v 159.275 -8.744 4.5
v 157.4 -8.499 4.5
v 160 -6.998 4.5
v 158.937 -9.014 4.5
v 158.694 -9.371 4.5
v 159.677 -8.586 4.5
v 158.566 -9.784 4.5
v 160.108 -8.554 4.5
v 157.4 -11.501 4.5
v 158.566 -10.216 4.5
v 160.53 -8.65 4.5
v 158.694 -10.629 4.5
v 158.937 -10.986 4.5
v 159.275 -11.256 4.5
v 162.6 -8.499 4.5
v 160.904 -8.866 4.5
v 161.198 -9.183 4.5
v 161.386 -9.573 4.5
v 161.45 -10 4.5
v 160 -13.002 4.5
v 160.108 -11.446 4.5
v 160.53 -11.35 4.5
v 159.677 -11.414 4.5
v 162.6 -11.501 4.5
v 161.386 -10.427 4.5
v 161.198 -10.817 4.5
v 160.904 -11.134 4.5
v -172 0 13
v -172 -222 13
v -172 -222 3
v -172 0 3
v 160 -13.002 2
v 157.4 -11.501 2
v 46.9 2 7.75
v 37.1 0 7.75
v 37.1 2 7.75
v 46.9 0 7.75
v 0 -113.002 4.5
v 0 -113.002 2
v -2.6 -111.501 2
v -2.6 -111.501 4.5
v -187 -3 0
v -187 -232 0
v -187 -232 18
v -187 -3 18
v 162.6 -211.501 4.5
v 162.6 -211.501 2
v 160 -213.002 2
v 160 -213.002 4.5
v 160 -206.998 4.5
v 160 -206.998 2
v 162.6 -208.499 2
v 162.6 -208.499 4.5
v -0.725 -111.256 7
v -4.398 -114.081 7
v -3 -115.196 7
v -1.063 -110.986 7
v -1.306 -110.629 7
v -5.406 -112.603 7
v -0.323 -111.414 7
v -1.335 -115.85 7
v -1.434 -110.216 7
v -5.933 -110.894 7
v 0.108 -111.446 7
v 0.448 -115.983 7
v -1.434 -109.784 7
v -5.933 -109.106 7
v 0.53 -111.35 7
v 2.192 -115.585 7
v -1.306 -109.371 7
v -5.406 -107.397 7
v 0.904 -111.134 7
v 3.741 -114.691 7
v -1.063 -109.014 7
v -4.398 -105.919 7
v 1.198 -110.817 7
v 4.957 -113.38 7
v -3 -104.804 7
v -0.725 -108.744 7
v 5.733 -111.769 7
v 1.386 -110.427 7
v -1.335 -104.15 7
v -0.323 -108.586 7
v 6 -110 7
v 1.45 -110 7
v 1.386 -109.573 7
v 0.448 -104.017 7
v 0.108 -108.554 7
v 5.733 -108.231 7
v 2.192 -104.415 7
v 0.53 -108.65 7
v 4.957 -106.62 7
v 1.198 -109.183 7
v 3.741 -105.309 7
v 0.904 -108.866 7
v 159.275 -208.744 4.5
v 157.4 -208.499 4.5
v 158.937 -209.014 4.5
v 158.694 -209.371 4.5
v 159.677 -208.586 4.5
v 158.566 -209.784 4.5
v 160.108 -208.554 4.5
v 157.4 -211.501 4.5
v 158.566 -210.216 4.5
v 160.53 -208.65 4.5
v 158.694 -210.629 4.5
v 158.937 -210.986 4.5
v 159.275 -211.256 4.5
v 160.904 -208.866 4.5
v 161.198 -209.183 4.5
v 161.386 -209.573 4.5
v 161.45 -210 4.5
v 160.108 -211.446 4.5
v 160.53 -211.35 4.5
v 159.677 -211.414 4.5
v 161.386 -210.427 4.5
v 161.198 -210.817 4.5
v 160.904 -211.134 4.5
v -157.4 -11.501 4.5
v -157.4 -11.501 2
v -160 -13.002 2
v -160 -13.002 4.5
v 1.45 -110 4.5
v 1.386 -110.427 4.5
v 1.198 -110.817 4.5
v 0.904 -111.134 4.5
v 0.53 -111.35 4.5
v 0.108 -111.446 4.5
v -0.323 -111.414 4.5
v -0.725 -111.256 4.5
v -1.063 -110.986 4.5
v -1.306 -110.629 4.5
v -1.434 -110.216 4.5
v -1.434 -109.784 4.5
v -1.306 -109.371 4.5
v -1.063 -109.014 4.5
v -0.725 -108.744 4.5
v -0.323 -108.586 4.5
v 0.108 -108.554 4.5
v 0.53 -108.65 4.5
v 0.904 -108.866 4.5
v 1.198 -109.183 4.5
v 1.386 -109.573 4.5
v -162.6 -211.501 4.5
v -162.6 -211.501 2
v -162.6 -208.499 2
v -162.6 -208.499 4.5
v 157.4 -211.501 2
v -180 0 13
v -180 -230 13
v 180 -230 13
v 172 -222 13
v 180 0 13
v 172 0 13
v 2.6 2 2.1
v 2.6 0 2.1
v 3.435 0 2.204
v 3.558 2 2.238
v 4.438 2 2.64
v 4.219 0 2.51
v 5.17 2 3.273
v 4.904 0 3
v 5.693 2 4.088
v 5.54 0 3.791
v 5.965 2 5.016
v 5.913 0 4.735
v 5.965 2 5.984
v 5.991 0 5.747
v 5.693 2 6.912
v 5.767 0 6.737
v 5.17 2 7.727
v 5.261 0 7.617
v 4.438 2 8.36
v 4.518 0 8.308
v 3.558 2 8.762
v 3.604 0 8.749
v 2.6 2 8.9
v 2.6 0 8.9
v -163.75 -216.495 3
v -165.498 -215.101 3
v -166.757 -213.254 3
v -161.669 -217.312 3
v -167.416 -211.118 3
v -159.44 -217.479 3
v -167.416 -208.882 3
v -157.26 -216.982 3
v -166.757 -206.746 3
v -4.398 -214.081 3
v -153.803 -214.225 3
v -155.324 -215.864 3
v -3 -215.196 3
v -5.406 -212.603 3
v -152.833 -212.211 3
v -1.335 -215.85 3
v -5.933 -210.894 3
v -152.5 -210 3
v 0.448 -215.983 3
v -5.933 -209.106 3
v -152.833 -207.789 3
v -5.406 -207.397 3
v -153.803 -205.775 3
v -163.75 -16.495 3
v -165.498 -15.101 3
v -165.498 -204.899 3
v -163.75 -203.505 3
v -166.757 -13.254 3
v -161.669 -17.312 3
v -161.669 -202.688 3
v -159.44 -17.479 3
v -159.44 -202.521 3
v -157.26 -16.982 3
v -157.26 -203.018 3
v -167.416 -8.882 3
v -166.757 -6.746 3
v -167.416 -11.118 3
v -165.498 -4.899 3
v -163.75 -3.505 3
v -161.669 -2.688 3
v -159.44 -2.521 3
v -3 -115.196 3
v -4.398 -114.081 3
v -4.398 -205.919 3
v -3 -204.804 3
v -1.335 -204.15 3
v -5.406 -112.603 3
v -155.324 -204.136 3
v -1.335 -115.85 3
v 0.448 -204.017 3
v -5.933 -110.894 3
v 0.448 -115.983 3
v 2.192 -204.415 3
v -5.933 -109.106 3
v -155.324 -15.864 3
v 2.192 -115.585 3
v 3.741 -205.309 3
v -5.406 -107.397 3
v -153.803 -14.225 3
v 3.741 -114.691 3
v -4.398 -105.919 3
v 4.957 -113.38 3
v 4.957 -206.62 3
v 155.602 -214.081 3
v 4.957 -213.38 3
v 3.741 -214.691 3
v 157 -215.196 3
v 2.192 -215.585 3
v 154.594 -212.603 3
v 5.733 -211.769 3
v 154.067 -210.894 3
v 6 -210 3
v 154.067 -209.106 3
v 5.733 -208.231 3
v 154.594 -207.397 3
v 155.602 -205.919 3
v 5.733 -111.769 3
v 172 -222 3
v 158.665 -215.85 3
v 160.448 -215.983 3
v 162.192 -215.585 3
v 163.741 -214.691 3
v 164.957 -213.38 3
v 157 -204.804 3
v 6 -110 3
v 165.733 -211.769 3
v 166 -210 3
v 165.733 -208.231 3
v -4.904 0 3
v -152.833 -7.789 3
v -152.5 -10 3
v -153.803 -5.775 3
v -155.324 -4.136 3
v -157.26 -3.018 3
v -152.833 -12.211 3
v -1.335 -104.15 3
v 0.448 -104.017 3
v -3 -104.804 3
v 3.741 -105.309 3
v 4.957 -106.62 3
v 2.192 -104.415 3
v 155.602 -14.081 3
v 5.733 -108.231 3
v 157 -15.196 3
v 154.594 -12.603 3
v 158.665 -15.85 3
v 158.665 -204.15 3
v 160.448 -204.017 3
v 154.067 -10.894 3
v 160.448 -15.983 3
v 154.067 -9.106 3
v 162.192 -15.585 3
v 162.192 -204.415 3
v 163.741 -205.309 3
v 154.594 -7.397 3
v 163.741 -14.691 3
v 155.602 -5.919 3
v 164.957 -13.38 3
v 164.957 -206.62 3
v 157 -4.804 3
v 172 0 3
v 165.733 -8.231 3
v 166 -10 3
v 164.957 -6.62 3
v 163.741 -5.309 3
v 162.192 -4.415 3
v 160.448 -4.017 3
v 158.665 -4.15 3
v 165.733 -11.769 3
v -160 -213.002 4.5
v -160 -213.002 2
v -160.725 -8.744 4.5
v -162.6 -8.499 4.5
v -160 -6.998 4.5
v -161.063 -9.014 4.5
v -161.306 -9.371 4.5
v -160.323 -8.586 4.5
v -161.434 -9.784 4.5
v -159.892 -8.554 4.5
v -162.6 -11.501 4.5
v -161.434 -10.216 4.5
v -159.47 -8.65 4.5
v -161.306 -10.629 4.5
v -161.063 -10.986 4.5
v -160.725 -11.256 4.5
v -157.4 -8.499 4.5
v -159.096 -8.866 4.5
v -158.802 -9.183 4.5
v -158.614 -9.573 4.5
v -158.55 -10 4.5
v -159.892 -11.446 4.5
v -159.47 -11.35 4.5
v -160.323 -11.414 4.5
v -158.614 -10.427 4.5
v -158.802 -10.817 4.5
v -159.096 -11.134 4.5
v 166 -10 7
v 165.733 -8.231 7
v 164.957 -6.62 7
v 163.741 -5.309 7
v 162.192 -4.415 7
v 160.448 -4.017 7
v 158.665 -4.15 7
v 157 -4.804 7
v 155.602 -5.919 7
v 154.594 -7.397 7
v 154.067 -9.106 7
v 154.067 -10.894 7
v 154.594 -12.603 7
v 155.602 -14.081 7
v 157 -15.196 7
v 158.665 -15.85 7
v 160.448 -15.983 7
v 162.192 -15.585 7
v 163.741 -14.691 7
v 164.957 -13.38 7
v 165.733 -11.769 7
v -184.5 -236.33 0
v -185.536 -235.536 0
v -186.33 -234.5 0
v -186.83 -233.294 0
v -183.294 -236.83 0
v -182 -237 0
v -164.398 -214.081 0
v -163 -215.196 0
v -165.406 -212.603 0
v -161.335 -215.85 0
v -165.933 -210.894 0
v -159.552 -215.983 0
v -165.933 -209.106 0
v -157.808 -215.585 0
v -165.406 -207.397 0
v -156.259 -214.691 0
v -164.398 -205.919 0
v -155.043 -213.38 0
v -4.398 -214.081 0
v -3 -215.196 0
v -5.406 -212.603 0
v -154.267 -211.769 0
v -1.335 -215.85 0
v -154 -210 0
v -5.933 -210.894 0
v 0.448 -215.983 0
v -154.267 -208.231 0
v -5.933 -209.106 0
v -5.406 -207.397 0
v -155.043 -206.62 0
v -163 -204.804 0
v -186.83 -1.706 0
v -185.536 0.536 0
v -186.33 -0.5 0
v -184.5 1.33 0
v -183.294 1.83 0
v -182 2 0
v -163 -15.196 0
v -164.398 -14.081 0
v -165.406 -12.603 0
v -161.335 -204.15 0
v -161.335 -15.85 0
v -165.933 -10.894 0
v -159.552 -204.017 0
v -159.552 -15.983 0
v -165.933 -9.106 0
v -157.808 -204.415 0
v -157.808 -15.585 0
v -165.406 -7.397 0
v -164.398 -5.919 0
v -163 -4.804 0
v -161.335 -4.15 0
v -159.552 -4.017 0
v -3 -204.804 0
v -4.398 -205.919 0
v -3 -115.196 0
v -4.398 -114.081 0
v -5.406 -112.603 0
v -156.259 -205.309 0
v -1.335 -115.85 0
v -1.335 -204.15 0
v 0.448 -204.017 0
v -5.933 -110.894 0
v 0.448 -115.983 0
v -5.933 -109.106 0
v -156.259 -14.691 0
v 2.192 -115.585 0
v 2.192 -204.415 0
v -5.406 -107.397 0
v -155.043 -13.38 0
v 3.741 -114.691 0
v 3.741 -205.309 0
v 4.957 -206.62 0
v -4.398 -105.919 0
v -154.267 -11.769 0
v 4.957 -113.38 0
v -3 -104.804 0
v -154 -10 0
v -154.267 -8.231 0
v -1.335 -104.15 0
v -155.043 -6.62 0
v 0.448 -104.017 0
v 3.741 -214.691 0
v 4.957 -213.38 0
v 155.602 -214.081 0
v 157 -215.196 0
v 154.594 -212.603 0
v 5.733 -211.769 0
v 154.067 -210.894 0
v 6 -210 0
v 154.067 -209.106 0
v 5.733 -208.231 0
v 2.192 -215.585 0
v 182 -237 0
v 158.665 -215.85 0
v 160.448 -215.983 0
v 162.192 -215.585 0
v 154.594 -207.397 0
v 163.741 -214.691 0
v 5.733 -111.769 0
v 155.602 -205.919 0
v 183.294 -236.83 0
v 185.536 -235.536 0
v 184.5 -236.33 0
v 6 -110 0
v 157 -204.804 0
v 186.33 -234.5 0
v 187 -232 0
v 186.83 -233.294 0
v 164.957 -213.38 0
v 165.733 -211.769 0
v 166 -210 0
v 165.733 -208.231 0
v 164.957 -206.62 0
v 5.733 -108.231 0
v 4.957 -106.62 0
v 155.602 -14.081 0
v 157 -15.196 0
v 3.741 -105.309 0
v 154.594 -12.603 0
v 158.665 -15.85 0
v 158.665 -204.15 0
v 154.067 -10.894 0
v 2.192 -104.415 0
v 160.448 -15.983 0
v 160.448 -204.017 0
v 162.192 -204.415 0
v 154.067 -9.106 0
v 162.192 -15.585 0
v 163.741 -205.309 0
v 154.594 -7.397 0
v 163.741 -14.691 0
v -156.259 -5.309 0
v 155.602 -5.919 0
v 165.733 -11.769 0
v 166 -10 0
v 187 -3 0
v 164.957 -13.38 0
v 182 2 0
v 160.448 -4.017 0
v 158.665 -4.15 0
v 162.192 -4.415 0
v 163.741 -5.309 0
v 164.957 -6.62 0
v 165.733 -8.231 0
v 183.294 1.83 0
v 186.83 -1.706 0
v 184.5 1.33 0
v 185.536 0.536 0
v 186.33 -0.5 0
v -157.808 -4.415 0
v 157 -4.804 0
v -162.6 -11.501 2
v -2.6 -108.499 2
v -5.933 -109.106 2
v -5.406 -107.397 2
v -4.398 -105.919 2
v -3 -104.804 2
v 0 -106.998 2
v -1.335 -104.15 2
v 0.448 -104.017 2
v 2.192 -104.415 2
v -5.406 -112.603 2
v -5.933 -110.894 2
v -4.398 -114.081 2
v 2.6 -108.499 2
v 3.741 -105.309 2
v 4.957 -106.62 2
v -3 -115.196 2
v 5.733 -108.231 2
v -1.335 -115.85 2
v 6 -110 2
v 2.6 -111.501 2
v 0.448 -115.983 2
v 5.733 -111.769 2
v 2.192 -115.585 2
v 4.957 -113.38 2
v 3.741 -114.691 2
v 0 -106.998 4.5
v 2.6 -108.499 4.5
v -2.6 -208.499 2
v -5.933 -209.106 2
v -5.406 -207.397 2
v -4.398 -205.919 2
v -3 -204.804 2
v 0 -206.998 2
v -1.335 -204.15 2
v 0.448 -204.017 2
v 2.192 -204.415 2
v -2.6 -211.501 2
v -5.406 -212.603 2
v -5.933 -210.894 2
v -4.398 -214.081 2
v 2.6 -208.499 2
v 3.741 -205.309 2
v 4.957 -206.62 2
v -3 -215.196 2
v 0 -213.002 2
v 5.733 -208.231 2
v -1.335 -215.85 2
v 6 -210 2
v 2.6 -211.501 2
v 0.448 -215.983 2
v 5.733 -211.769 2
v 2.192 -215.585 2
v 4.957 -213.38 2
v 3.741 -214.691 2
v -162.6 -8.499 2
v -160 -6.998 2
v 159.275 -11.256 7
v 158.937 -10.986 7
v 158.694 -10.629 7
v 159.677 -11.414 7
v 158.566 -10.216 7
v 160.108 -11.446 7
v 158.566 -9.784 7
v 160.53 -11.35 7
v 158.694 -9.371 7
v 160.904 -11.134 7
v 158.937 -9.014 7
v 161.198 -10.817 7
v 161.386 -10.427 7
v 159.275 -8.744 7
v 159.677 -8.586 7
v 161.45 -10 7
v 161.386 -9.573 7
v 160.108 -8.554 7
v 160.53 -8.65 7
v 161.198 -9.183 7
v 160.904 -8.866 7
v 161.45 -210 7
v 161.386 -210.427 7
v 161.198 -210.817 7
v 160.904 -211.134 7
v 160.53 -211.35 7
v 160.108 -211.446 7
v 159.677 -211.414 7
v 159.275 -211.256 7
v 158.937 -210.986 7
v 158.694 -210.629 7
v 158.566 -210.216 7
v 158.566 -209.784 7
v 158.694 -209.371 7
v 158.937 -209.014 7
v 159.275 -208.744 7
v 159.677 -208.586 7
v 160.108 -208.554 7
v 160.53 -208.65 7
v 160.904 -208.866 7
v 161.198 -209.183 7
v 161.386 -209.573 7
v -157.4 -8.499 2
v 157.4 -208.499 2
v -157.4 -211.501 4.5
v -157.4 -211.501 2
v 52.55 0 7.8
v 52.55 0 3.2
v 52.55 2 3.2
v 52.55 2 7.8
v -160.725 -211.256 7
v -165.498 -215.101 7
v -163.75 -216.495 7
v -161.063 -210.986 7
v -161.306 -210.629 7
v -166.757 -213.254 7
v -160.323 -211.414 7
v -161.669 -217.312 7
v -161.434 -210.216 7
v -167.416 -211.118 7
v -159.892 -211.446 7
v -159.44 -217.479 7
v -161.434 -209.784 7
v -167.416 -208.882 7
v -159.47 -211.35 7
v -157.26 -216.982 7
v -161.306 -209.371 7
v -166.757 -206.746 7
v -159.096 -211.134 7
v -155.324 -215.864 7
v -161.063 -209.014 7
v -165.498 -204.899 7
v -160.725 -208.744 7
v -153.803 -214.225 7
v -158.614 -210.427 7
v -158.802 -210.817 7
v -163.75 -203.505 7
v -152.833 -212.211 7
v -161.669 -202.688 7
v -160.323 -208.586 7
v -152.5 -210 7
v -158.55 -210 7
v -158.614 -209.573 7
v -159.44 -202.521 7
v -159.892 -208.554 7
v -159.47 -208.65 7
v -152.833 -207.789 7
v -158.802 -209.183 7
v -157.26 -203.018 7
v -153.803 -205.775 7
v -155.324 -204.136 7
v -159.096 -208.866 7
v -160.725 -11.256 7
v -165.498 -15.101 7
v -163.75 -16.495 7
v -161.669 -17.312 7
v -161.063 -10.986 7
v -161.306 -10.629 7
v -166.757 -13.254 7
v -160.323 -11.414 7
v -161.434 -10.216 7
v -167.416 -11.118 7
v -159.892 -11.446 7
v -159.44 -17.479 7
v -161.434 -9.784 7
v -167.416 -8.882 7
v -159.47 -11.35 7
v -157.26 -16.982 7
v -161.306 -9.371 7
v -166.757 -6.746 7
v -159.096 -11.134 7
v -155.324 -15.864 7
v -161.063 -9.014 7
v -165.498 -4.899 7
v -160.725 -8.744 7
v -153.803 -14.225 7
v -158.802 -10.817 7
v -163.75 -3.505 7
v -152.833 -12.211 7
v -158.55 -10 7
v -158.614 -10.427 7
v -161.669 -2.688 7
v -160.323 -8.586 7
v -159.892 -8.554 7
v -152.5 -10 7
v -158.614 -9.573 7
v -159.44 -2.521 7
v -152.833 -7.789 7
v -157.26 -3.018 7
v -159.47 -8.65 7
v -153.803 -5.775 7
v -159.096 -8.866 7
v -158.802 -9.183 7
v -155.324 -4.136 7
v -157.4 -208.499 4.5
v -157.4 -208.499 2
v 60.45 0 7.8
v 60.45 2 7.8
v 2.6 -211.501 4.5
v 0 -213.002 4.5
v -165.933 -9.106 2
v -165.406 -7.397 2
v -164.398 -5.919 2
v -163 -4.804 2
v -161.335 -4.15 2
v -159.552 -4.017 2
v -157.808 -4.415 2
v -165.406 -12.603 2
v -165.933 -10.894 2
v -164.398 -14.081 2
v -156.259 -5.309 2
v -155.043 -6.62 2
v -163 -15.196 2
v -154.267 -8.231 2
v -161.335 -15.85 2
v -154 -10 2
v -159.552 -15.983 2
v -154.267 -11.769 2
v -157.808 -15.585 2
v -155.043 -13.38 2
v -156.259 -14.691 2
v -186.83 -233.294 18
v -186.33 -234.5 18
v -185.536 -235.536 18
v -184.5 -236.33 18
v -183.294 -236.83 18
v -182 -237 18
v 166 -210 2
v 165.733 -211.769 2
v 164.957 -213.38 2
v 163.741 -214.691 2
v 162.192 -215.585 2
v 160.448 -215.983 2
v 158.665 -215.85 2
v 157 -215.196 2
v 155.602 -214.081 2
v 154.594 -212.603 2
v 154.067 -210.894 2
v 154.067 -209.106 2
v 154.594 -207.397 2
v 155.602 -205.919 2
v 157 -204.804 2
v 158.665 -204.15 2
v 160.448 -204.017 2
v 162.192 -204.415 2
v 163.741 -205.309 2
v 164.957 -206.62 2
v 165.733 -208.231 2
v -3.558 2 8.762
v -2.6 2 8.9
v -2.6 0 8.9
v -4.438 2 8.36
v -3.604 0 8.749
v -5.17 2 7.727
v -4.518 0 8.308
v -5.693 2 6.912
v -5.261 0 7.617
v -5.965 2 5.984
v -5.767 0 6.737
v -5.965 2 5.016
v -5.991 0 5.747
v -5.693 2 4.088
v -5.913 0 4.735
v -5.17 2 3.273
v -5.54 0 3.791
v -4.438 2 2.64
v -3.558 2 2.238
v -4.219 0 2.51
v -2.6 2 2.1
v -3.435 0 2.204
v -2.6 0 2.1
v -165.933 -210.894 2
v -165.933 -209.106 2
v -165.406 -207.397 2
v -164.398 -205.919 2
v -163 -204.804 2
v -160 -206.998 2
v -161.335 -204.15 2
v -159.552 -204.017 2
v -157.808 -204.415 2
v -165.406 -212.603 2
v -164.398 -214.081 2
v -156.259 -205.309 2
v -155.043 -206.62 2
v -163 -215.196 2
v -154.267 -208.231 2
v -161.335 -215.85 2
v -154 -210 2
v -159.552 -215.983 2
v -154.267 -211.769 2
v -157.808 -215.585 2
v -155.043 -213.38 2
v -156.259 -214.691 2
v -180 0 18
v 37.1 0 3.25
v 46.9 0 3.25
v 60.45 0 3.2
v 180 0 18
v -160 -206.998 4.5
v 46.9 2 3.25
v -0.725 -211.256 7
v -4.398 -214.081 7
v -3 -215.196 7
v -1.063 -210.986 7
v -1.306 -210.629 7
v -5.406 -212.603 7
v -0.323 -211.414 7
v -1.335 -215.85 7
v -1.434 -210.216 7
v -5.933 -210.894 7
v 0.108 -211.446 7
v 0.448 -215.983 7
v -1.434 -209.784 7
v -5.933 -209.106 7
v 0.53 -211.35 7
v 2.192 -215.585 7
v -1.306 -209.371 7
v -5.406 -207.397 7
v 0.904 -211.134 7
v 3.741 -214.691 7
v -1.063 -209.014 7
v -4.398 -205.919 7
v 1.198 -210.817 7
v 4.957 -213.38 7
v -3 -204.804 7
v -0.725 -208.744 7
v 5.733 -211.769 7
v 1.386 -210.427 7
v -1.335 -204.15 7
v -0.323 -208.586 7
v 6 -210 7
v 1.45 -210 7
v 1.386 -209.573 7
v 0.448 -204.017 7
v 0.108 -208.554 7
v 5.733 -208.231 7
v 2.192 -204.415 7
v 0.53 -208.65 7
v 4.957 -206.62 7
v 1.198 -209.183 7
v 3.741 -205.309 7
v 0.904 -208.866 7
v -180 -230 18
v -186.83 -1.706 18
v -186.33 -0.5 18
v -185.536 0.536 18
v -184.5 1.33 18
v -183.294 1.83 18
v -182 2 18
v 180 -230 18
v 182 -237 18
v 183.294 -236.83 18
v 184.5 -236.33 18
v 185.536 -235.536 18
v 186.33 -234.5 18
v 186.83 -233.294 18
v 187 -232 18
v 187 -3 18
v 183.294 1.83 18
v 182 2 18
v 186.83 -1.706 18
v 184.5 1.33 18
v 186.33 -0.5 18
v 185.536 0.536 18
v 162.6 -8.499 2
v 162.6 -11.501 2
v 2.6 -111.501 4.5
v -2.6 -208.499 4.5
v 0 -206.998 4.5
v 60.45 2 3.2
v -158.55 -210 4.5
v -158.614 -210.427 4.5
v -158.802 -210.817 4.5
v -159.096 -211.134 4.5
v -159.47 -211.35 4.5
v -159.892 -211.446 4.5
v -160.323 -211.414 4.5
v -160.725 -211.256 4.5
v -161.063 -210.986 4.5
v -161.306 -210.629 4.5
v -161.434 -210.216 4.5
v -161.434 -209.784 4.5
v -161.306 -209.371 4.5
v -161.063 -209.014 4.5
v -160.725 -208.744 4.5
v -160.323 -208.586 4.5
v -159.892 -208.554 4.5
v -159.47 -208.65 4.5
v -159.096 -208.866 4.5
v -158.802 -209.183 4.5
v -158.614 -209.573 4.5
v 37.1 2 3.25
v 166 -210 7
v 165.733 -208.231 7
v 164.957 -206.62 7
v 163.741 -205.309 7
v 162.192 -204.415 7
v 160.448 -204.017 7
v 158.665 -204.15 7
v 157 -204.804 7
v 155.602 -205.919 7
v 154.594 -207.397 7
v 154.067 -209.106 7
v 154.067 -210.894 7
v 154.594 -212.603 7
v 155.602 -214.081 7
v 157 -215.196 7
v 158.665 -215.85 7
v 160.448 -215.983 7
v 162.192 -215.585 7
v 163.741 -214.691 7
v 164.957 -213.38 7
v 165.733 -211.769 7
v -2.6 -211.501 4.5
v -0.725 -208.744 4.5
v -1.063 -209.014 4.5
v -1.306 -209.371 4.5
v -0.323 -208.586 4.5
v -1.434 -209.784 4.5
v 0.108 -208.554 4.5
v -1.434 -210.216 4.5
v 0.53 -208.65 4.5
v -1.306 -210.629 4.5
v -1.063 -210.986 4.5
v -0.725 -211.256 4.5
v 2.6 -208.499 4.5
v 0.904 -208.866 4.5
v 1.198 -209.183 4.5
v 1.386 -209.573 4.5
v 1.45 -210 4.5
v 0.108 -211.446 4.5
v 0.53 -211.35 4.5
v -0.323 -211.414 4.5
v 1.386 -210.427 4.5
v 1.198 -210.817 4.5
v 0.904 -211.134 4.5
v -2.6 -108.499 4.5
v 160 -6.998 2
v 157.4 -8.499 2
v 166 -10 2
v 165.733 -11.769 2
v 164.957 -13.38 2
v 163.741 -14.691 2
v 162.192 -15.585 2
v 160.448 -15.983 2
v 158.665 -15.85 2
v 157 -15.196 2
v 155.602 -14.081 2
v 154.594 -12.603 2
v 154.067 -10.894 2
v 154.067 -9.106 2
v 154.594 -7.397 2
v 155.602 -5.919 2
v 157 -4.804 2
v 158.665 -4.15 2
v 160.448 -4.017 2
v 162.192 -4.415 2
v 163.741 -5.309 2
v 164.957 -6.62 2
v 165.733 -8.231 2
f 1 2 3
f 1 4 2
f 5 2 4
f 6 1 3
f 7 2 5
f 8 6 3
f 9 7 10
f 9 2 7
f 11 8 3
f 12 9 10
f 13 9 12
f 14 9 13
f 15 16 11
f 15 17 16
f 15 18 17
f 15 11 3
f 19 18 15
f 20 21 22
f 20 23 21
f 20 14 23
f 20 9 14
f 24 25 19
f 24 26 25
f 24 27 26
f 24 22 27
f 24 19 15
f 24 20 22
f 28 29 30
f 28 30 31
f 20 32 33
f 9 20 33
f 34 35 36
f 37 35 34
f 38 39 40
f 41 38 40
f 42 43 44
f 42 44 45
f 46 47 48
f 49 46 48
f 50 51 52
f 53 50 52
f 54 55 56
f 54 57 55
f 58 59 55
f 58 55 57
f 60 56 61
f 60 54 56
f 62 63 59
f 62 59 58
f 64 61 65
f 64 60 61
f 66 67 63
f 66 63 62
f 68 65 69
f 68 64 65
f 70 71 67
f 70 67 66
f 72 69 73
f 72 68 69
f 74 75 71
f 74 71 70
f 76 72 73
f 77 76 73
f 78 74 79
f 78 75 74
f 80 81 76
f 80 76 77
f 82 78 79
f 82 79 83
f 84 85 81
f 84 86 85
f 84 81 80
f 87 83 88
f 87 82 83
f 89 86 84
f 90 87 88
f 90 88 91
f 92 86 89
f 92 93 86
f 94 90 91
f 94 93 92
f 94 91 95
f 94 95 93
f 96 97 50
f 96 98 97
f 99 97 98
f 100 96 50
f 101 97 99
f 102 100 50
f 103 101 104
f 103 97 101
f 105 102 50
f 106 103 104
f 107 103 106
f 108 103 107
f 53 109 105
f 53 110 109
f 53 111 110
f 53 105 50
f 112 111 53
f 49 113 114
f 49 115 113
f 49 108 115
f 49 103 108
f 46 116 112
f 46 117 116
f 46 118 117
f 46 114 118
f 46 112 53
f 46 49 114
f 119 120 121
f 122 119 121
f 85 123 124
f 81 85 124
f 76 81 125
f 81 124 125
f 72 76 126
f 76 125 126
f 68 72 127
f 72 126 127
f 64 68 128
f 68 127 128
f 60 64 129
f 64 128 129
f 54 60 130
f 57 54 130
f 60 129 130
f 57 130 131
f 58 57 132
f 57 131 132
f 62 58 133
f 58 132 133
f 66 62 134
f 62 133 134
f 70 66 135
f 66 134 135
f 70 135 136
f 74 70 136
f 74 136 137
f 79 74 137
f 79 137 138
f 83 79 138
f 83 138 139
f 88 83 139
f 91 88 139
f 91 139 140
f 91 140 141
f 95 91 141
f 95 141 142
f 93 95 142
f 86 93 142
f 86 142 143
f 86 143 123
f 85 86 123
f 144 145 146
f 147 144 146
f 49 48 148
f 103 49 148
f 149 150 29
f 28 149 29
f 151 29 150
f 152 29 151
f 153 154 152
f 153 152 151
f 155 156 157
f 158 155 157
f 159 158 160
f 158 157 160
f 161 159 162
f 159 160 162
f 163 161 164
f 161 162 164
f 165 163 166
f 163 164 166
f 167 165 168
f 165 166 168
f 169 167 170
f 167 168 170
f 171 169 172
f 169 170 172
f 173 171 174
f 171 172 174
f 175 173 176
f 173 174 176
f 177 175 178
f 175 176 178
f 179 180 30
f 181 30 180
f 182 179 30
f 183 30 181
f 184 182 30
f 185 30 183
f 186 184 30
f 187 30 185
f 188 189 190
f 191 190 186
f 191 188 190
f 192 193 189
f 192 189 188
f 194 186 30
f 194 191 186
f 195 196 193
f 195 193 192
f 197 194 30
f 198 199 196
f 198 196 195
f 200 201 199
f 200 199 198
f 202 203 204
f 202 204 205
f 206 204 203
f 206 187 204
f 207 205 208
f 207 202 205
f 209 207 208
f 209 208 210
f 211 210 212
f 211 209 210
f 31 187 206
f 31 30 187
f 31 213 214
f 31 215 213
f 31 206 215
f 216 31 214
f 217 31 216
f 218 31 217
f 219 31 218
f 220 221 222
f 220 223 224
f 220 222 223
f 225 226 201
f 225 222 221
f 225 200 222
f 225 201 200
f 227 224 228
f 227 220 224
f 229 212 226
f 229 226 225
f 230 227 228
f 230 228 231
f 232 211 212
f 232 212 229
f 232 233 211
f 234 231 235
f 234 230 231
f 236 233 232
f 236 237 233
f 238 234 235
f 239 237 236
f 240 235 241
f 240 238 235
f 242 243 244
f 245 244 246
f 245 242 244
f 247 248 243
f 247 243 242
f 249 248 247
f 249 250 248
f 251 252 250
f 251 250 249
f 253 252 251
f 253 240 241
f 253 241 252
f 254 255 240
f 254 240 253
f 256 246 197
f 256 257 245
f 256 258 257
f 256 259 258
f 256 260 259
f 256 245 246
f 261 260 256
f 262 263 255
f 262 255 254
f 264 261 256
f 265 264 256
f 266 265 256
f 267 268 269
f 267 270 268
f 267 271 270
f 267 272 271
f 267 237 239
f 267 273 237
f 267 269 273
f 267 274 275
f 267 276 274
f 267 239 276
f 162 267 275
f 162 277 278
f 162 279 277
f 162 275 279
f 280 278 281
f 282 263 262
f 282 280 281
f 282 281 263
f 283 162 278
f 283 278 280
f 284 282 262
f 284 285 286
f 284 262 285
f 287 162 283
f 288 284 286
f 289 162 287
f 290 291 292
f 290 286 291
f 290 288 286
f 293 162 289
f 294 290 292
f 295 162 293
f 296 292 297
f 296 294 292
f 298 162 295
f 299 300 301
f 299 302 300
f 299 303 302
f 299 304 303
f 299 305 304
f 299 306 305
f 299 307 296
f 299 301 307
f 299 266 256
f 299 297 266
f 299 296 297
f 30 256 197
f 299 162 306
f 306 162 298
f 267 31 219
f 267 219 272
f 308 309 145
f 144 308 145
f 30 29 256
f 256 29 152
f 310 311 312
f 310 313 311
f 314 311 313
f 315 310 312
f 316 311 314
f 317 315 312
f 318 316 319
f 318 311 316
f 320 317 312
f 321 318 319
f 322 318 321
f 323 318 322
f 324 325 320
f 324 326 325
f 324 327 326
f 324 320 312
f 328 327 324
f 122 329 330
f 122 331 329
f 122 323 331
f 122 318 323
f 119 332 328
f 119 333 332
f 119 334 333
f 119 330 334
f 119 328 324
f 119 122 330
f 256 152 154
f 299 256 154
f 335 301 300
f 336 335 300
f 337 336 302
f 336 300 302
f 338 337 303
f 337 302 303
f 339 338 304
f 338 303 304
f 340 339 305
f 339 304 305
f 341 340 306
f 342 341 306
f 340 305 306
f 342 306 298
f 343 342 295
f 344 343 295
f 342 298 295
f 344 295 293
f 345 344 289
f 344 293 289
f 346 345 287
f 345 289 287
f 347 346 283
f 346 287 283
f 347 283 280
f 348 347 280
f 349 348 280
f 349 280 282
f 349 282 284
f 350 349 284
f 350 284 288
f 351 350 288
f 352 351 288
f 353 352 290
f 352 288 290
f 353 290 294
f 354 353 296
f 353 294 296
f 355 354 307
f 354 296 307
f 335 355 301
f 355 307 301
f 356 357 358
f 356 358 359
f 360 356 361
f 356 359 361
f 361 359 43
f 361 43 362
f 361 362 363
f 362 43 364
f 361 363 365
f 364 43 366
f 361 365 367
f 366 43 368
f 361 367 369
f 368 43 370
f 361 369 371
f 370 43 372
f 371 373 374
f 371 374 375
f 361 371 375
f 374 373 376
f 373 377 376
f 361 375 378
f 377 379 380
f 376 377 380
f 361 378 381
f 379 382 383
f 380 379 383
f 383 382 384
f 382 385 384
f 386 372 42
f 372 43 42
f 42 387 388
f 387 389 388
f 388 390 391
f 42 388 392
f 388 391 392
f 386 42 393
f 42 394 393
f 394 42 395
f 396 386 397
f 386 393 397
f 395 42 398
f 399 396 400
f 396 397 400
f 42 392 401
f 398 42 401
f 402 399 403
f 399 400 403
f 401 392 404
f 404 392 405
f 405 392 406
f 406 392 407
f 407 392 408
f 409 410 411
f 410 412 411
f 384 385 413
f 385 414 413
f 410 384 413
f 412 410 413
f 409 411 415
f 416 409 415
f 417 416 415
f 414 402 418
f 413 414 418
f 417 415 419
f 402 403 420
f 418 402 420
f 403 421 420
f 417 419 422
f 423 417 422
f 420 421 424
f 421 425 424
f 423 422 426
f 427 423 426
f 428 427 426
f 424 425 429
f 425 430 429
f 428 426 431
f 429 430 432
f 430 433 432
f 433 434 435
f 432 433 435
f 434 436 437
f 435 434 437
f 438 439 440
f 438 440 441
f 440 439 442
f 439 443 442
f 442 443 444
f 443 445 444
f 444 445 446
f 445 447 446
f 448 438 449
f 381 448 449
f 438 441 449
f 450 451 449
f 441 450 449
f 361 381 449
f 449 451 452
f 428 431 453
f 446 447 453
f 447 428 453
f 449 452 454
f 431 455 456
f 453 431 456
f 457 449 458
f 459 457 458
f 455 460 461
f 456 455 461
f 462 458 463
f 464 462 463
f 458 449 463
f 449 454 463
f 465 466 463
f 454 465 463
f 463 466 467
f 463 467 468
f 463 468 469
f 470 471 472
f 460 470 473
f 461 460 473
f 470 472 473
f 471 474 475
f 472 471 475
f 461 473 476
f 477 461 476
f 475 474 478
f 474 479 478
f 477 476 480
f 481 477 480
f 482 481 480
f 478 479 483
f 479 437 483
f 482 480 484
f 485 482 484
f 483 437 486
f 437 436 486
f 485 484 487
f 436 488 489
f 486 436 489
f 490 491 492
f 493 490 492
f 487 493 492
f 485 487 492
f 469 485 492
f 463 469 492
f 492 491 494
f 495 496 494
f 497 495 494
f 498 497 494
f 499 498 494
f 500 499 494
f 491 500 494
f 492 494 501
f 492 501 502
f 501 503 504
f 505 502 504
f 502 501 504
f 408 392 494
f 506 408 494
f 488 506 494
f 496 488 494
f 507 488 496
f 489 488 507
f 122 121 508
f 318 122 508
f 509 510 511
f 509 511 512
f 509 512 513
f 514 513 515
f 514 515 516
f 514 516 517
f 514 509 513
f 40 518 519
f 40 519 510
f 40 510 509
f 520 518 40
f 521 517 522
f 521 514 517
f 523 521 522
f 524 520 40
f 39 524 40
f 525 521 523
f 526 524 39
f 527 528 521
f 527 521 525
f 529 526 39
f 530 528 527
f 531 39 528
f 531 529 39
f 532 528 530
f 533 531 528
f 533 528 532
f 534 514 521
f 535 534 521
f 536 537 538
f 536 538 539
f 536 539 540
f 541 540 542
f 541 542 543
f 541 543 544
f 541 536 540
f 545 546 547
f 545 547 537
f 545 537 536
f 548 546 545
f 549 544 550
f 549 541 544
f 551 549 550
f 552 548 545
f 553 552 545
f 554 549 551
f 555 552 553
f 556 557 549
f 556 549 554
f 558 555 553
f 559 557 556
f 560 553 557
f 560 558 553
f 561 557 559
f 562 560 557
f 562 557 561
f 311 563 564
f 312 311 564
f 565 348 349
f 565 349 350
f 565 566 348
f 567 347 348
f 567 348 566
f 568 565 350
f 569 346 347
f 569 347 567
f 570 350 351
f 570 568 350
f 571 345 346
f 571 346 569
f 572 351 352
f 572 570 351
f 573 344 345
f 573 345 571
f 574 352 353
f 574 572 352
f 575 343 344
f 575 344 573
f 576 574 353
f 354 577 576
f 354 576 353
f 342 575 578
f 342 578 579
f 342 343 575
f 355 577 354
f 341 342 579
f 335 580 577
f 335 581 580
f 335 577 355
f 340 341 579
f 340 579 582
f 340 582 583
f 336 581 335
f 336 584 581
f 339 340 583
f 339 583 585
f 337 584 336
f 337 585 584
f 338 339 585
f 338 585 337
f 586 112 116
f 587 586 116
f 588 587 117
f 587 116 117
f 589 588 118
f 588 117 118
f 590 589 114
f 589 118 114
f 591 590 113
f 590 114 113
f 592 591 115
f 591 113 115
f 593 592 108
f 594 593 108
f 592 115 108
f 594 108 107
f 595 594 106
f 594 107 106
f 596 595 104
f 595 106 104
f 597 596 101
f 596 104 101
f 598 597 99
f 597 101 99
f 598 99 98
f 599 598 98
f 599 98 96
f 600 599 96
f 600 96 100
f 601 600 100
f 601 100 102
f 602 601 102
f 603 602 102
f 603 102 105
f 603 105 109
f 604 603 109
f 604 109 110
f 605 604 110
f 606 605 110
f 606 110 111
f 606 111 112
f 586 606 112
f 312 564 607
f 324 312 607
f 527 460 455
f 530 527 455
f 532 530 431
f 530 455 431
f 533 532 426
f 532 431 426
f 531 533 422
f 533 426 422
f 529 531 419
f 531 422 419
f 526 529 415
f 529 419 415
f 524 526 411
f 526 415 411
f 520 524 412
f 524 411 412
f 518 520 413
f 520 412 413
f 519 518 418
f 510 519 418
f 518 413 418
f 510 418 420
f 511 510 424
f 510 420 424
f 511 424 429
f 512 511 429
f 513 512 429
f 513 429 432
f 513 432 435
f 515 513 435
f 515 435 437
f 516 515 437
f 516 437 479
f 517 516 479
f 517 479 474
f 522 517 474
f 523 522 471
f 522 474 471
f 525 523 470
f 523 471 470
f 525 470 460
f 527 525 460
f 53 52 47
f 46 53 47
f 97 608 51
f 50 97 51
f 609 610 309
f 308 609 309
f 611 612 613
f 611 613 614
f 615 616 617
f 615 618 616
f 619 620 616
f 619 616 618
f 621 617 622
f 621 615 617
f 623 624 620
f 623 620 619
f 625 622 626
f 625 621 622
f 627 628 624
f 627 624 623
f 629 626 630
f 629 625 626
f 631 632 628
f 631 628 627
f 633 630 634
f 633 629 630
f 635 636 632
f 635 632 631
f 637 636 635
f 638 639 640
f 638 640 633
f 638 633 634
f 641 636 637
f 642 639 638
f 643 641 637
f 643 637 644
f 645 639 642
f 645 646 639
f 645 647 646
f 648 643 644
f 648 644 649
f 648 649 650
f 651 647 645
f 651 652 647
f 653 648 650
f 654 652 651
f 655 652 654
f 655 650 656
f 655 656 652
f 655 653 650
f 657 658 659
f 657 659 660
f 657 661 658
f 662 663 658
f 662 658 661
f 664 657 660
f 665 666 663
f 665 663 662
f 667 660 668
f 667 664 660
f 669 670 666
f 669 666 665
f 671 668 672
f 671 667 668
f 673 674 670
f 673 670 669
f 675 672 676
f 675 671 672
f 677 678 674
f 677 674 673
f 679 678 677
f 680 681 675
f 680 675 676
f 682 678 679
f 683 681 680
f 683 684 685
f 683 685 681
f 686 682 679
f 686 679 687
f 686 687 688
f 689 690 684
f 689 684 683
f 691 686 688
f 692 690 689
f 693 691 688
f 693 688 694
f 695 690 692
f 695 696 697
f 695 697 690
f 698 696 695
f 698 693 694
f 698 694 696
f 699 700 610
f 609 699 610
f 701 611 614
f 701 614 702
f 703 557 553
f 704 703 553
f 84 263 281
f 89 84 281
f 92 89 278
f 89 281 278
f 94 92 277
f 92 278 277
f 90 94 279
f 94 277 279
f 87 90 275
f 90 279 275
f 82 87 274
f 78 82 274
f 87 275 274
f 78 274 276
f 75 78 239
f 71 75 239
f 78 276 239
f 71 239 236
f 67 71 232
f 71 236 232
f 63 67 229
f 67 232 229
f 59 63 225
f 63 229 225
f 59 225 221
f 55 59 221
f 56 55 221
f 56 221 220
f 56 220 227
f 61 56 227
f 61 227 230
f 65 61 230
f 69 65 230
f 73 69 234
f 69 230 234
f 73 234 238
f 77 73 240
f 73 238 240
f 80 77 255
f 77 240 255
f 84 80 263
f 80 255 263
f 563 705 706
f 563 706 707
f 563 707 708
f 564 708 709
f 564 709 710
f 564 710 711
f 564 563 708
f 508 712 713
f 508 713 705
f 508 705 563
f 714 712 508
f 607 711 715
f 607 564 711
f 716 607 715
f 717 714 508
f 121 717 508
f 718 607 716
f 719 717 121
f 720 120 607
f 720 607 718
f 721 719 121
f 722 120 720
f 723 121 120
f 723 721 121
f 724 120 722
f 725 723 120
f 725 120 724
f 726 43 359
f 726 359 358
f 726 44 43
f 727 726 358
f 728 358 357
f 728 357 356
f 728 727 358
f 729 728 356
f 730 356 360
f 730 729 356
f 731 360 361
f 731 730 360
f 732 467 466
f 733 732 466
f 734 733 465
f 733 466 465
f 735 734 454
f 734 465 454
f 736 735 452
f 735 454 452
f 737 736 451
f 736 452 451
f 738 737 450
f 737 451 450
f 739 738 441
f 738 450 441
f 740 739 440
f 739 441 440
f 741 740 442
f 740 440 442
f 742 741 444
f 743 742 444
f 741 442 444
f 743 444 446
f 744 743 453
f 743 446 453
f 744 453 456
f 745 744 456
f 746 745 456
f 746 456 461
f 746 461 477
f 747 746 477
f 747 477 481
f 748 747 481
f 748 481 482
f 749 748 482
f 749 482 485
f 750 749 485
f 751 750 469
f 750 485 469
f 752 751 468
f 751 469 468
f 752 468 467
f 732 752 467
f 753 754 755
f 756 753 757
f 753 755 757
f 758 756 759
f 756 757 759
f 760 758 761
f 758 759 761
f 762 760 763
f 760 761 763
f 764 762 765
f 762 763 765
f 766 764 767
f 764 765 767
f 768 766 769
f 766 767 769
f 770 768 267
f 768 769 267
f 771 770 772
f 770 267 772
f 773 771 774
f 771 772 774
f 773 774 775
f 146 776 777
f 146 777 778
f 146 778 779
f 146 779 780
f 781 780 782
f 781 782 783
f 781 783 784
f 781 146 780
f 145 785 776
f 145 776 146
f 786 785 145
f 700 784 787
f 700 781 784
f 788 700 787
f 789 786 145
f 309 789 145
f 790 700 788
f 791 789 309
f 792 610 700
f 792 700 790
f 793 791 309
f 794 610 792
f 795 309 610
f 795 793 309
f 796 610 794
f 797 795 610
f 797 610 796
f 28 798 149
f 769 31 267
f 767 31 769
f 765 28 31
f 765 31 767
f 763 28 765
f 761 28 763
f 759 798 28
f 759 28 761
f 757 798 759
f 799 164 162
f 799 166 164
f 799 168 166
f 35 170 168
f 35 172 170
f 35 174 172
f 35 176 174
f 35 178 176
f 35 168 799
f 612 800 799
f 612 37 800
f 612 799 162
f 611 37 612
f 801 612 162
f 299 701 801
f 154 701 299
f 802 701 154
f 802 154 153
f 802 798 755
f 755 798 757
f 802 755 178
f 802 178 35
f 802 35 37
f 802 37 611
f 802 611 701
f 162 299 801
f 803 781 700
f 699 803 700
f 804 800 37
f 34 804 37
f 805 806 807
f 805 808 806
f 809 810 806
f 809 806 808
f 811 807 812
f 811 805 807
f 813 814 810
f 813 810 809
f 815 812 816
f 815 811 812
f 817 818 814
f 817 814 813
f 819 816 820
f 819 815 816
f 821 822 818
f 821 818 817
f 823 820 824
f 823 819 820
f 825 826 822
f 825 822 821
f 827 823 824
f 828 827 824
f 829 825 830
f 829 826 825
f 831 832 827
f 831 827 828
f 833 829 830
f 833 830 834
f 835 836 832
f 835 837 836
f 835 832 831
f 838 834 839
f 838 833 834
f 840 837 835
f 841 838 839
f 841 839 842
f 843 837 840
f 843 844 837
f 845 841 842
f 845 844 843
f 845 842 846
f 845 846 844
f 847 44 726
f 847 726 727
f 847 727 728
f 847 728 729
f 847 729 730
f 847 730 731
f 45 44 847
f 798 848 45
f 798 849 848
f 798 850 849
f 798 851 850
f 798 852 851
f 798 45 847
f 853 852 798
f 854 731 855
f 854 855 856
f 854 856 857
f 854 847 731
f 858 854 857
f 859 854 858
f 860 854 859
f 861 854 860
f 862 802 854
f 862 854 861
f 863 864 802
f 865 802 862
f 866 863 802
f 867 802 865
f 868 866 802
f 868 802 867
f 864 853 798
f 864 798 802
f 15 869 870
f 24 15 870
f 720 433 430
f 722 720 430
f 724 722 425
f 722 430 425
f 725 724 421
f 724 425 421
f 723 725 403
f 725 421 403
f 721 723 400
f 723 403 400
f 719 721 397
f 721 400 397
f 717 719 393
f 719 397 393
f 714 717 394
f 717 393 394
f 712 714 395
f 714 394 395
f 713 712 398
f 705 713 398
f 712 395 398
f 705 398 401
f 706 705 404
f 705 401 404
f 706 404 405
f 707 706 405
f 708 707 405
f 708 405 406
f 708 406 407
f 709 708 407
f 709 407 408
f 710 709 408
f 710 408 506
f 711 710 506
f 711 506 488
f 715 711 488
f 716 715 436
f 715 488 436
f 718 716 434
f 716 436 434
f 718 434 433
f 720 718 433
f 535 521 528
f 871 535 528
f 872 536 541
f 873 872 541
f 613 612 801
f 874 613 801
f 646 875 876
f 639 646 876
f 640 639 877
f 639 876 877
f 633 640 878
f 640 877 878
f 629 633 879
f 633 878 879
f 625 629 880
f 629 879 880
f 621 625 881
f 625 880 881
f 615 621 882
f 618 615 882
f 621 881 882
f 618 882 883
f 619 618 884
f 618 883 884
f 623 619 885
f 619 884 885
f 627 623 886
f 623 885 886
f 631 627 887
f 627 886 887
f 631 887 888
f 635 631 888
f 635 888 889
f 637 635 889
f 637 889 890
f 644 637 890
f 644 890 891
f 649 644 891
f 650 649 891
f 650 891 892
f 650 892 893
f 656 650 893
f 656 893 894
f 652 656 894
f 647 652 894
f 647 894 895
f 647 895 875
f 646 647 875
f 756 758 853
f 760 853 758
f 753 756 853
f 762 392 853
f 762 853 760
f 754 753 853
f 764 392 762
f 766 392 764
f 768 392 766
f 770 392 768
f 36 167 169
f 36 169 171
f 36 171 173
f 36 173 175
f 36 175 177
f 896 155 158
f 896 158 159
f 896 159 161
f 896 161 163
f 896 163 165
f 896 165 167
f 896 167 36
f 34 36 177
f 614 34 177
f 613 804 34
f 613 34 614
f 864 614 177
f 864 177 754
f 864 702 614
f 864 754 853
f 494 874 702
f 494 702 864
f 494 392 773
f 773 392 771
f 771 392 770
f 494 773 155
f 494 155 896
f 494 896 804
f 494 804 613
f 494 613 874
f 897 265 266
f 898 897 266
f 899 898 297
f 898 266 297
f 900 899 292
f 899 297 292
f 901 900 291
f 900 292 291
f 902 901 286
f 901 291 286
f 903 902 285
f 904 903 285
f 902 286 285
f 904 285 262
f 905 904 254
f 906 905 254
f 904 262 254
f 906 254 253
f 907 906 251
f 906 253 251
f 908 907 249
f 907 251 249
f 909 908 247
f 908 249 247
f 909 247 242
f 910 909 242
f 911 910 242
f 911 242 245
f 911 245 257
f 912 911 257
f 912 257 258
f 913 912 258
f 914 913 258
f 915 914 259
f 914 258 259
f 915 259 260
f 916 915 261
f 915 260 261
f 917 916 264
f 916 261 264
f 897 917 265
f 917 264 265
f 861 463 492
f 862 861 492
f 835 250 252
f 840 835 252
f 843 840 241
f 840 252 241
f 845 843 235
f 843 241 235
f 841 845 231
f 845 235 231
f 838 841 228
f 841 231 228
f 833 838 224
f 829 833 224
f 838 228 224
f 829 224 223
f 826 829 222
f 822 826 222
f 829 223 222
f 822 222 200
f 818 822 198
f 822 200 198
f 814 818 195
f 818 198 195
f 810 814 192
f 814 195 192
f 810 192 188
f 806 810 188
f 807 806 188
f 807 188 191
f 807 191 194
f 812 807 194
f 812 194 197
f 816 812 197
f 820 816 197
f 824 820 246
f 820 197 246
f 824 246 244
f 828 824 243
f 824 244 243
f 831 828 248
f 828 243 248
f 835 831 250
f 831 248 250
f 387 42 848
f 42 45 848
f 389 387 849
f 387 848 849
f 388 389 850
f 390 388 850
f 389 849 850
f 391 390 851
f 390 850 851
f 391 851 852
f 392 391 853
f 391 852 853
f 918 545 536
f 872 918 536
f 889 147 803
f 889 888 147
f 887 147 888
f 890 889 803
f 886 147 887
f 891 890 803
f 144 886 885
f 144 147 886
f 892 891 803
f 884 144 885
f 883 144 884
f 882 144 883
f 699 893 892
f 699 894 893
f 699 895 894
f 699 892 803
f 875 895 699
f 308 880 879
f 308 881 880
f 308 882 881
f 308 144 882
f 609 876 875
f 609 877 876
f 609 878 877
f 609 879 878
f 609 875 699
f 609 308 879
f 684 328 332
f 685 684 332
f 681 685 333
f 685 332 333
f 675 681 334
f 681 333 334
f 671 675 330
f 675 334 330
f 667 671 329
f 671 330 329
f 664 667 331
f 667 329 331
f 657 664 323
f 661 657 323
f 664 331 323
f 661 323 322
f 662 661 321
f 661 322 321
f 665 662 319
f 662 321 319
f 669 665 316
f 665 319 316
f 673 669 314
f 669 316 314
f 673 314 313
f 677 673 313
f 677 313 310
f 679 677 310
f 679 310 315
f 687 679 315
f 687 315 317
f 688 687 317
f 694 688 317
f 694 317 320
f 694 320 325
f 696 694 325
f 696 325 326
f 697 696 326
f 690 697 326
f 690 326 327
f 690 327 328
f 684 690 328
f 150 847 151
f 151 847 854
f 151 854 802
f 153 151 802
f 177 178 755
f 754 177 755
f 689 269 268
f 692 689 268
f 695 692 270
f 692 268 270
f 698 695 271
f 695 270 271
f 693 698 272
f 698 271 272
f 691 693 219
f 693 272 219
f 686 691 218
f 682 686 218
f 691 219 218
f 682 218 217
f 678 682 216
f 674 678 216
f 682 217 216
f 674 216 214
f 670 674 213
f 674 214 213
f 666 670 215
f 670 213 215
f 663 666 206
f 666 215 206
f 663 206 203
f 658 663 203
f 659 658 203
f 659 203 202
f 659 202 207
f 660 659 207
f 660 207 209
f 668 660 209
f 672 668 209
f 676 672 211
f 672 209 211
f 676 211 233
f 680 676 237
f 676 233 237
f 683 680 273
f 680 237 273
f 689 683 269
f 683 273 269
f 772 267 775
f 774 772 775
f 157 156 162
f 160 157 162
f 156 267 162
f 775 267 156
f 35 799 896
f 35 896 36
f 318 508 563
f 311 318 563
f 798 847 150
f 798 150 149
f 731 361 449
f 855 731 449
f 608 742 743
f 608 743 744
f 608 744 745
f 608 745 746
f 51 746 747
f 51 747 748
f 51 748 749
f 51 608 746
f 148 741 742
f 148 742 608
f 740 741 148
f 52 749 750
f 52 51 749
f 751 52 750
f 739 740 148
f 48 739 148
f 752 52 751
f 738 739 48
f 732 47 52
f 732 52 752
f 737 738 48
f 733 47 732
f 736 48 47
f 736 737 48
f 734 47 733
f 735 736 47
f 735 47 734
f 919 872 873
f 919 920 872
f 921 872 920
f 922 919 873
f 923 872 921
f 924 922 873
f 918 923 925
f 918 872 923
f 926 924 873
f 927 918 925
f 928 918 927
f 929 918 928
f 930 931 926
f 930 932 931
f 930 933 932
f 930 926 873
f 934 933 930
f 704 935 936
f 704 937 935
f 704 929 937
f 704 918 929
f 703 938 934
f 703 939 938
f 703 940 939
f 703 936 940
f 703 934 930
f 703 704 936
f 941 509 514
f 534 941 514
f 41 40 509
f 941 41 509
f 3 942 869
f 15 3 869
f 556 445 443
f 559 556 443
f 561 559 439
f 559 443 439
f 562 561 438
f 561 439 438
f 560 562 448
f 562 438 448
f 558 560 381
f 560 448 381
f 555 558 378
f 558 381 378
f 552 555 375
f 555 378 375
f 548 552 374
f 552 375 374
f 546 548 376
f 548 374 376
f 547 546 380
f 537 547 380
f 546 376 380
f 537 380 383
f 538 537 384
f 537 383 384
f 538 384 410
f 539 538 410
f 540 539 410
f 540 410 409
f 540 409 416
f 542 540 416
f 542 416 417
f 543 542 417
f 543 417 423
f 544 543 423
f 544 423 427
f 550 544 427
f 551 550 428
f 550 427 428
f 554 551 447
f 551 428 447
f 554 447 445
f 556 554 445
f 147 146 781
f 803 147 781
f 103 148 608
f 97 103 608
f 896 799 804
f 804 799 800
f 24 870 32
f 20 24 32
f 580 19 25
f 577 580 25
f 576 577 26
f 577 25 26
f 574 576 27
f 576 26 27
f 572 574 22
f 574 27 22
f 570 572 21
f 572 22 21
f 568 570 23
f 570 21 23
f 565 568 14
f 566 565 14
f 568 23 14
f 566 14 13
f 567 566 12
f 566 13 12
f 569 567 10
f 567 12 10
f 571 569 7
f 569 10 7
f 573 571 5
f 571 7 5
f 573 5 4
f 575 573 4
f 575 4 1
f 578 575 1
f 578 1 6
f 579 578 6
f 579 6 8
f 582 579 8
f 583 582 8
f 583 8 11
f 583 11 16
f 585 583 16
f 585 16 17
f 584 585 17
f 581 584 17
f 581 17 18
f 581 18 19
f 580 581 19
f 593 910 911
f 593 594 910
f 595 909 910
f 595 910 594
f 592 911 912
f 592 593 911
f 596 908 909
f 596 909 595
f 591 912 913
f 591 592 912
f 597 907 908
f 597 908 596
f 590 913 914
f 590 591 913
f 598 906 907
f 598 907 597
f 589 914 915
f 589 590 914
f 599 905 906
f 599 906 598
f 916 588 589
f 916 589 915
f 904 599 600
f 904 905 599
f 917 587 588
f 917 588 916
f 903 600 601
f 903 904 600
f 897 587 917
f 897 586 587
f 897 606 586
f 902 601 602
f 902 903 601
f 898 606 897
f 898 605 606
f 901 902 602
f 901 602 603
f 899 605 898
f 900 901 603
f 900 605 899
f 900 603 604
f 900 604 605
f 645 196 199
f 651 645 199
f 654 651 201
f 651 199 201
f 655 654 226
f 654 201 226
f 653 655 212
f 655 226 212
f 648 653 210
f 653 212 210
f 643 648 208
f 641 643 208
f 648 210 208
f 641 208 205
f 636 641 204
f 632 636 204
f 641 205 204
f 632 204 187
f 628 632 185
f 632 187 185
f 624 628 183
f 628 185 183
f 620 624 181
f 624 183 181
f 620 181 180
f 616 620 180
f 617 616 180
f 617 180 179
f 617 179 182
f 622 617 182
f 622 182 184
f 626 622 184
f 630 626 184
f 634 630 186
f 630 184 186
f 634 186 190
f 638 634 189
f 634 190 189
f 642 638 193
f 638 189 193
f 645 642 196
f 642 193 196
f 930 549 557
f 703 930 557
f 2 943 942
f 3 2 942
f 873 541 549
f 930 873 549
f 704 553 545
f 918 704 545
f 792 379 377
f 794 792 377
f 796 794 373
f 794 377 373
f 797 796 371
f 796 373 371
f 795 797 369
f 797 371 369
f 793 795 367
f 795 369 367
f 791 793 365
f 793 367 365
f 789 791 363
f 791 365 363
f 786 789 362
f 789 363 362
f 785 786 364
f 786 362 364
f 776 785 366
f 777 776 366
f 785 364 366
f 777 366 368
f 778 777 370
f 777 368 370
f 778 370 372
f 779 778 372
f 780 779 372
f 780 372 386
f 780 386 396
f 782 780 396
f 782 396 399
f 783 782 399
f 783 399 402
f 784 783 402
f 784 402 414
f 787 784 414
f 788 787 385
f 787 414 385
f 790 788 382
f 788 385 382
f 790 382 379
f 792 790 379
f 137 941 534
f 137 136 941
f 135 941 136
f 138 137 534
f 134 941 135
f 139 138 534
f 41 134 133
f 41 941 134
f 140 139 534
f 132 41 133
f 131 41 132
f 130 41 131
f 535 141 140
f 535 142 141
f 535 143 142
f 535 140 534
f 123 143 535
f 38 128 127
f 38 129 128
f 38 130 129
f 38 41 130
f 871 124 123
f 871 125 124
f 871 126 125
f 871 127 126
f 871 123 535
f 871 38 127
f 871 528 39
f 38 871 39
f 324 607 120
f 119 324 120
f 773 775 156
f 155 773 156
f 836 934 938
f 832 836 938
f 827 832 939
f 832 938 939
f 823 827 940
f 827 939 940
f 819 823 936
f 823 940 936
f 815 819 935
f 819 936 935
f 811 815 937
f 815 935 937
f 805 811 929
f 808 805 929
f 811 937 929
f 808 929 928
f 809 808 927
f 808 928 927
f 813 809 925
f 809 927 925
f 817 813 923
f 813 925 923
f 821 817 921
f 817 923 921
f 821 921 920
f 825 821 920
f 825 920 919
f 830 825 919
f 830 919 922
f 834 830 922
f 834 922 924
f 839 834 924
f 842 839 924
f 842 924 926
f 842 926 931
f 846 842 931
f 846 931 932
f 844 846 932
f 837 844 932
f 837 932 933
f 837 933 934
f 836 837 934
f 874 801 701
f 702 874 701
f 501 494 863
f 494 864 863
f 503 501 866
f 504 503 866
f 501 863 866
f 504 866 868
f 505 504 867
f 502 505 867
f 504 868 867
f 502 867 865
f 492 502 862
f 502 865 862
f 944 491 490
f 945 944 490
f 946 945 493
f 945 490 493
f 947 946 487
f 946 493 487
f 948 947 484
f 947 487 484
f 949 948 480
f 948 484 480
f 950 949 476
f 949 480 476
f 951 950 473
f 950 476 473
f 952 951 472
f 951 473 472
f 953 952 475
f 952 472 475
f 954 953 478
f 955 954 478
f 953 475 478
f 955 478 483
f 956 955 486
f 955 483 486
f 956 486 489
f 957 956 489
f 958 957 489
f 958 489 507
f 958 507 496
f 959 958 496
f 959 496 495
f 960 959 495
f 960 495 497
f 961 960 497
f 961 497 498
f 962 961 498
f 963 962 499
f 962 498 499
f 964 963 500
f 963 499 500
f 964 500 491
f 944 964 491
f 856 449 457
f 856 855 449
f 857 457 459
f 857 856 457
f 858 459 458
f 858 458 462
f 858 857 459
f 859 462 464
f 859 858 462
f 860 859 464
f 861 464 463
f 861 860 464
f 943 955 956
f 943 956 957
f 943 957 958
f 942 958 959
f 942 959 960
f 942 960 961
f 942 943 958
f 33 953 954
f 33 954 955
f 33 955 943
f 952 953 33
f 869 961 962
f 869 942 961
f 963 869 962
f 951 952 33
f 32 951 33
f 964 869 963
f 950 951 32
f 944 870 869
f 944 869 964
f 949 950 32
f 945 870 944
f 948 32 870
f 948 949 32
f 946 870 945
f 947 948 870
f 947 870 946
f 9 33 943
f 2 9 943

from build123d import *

# Parameters (mm, degrees)
SKETCH_W        = 374
SKETCH_H        = 239
PAD_DEPTH       = 18
SKETCH001_W     = 344
SKETCH001_H     = 222
POCKET_DEPTH    = 15
SKETCH002_R     = 6
SKETCH002_R_2   = 7.5
PAD001_DEPTH    = 4
SKETCH003_R     = 1.45
HOLE_DEPTH      = 25
POCKET001_DEPTH = 4.5
SKETCH005_W     = 360
SKETCH005_H     = 230
POCKET002_DEPTH = 5
SKETCH006_W     = 7.9
SKETCH006_H     = 4.6
SKETCH006_W_2   = 9.8
SKETCH006_H_2   = 4.5
POCKET003_DEPTH = 2
SKETCH011_R     = 6
HOLE004_DEPTH   = 2
FILLET_R        = 5


with BuildPart() as part:
    # Sketch → Pad (new body)
    with BuildSketch(Plane.XY):
        with Locations((0, -117.5)):
            Rectangle(SKETCH_W, SKETCH_H)
    extrude(amount=PAD_DEPTH)

    # Sketch001 (on Face6 of Pad) → Pocket (cut)
    with BuildSketch(Plane.XY.offset(18)):
        with Locations((0, -111)):
            Rectangle(SKETCH001_W, SKETCH001_H)
    extrude(amount=-POCKET_DEPTH, mode=Mode.SUBTRACT)

    # Sketch002 (on Face11 of Pocket) → Pad001 (join)
    with BuildSketch(Plane.XY.offset(3)):
        with Locations((0, -110)):
            Circle(SKETCH002_R)
        with Locations((160, -10)):
            Circle(SKETCH002_R)
        with Locations((160, -210)):
            Circle(SKETCH002_R)
        with Locations((0, -210)):
            Circle(SKETCH002_R)
        with Locations((-160, -10)):
            Circle(SKETCH002_R_2)
        with Locations((-160, -210)):
            Circle(SKETCH002_R_2)
    extrude(amount=PAD001_DEPTH)

    # Sketch003 (on Face4 of Pad001) → Hole (cut)
    with BuildSketch(Plane(origin=(0, 0, 0), x_dir=(1, 0, 0), z_dir=(0, 0, -1))):
        with Locations((0, 110)):
            Circle(SKETCH003_R)
        with Locations((0, 210)):
            Circle(SKETCH003_R)
        with Locations((-160, 10)):
            Circle(SKETCH003_R)
        with Locations((-160, 210)):
            Circle(SKETCH003_R)
        with Locations((160, 10)):
            Circle(SKETCH003_R)
        with Locations((160, 210)):
            Circle(SKETCH003_R)
    extrude(amount=-HOLE_DEPTH, mode=Mode.SUBTRACT)

    # Sketch004 (on Face4 of Hole) → Pocket001 (cut)
    with BuildSketch(Plane(origin=(0, 0, 0), x_dir=(1, 0, 0), z_dir=(0, 0, -1))):
        Polygon((2.6, 111.501111), (0, 113.002221), (-2.6, 111.501111), (-2.6, 108.498889), (0, 106.997779), (2.6, 108.498889), align=None)
        Polygon((2.6, 208.498889), (2.6, 211.501111), (0, 213.002221), (-2.6, 211.501111), (-2.6, 208.498889), (0, 206.997779), align=None)
        Polygon((162.6, 208.498889), (162.6, 211.501111), (160, 213.002221), (157.4, 211.501111), (157.4, 208.498889), (160, 206.997779), align=None)
        Polygon((162.6, 8.498889), (162.6, 11.501111), (160, 13.002221), (157.4, 11.501111), (157.4, 8.498889), (160, 6.997779), align=None)
        Polygon((-157.4, 8.498889), (-157.4, 11.501111), (-160, 13.002221), (-162.6, 11.501111), (-162.6, 8.498889), (-160, 6.997779), align=None)
        Polygon((-157.4, 208.498889), (-157.4, 211.501111), (-160, 213.002221), (-162.6, 211.501111), (-162.6, 208.498889), (-160, 206.997779), align=None)
    extrude(amount=-POCKET001_DEPTH, mode=Mode.SUBTRACT)

    # Sketch005 (on Face5 of Pocket001) → Pocket002 (cut)
    with BuildSketch(Plane.XY.offset(18)):
        with Locations((0, -115)):
            Rectangle(SKETCH005_W, SKETCH005_H)
    extrude(amount=-POCKET002_DEPTH, mode=Mode.SUBTRACT)

    # Sketch006 (on Pad) → Pocket003 (cut)
    with BuildSketch(Plane.XZ):
        with BuildLine():
            ThreePointArc((-2.6, 8.9), (-6, 5.5), (-2.6, 2.1))
            Line((-2.6, 2.1), (2.6, 2.1))
            ThreePointArc((2.6, 2.1), (6, 5.5), (2.6, 8.9))
            Line((2.6, 8.9), (-2.6, 8.9))
        make_face()
        with Locations((56.5, 5.5)):
            Rectangle(SKETCH006_W, SKETCH006_H)
        with Locations((42, 5.5)):
            Rectangle(SKETCH006_W_2, SKETCH006_H_2)
    extrude(amount=-POCKET003_DEPTH, mode=Mode.SUBTRACT)

    # Sketch011 (on Face4 of Pad001) → Hole004 (cut)
    with BuildSketch(Plane(origin=(0, 0, 0), x_dir=(1, 0, 0), z_dir=(0, 0, -1))):
        with Locations((0, 110)):
            Circle(SKETCH011_R)
        with Locations((0, 210)):
            Circle(SKETCH011_R)
        with Locations((-160, 10)):
            Circle(SKETCH011_R)
        with Locations((-160, 210)):
            Circle(SKETCH011_R)
        with Locations((160, 10)):
            Circle(SKETCH011_R)
        with Locations((160, 210)):
            Circle(SKETCH011_R)
    extrude(amount=-HOLE004_DEPTH, mode=Mode.SUBTRACT)

    # Fillet
    fillet_edges = [part.edges().sort_by_distance(p)[0] for p in [
        (-187, 2, 9),
        (-187, -237, 9),
        (187, 2, 9),
        (187, -237, 9),
    ]]
    fillet(fillet_edges, radius=FILLET_R)


solid = part.part
